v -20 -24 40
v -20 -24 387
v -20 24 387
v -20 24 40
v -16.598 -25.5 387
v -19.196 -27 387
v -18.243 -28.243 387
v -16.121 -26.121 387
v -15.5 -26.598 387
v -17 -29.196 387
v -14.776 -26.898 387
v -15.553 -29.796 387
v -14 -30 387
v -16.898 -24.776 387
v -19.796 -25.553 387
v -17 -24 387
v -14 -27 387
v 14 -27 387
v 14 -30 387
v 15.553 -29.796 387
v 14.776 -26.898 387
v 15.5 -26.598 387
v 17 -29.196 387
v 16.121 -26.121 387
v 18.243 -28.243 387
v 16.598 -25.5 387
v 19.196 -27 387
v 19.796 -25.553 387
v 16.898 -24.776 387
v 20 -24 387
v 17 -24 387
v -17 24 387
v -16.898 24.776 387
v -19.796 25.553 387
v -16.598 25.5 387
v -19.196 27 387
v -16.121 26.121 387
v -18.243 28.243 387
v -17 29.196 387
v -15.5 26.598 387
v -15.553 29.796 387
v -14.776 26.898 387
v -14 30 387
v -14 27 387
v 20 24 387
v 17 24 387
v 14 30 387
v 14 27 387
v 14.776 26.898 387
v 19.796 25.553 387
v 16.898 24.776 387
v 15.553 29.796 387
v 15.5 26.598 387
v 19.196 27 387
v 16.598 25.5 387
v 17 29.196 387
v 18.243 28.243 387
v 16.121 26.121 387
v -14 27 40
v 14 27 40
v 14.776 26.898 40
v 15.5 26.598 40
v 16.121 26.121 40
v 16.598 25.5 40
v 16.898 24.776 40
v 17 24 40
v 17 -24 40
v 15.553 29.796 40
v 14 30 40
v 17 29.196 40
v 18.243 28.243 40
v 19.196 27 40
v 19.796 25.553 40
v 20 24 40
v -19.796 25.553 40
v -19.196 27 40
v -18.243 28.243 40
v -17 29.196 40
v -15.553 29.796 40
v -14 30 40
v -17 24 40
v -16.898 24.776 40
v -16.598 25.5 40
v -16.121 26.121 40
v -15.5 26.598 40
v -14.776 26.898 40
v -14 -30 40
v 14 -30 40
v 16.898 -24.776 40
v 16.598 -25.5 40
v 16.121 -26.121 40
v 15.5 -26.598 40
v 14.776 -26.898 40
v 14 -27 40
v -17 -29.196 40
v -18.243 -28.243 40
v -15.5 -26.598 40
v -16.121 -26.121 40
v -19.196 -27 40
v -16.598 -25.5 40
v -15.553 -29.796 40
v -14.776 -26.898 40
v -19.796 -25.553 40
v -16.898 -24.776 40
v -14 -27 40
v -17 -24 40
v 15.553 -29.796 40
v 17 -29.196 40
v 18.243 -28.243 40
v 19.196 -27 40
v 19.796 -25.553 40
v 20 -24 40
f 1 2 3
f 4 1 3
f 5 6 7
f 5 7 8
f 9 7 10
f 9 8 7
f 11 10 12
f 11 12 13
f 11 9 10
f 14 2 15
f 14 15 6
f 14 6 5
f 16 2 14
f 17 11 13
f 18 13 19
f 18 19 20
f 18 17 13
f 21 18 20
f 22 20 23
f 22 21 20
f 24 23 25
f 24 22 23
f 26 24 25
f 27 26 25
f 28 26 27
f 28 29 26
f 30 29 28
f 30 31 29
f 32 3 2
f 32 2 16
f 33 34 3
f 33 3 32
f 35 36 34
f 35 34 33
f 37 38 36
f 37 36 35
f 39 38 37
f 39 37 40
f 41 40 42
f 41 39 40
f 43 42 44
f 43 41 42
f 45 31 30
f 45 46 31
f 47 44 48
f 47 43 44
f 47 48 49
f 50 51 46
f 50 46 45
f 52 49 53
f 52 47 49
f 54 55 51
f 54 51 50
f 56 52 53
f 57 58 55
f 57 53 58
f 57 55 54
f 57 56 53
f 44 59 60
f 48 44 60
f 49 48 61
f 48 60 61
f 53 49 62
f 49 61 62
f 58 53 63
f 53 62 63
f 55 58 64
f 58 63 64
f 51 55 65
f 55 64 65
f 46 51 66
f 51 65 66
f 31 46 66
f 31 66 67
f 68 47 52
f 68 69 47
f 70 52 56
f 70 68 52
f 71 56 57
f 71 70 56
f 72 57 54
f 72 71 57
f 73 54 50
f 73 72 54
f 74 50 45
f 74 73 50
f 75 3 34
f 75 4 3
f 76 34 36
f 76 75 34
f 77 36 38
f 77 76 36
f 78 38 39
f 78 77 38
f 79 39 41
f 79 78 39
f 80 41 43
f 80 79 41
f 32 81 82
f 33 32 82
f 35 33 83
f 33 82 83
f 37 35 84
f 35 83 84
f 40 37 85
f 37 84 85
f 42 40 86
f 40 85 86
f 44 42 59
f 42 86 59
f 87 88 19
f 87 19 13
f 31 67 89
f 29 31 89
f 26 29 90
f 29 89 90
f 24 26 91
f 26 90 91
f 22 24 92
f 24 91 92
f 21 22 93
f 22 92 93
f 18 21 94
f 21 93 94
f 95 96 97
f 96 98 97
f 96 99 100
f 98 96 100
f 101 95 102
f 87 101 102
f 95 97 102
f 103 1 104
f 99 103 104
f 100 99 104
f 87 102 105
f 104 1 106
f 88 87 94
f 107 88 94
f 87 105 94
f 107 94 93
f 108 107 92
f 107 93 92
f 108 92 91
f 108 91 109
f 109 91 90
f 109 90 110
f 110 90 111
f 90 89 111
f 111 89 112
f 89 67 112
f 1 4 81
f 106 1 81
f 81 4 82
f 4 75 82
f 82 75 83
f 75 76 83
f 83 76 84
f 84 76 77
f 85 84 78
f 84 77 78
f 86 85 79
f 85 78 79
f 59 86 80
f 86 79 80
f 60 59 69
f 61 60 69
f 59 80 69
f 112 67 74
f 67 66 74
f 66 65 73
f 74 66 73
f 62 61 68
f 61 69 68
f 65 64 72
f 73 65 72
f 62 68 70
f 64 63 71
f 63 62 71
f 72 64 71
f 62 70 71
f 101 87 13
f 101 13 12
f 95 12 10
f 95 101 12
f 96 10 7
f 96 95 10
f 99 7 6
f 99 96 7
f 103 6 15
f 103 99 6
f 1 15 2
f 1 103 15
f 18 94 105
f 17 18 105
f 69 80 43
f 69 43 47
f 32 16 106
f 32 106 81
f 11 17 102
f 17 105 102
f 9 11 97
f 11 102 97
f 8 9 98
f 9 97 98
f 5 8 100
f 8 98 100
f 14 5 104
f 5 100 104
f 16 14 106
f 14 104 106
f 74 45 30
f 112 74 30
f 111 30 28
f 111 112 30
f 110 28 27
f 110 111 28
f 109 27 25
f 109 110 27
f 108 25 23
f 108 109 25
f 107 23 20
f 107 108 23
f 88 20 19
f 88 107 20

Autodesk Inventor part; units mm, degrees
ref_plane "YZ Plane" through (0, 0, 0) normal (1, 0, 0) x (0, 1, 0)
ref_plane "Start Plane" through (0, 0, 40) normal (0, 0, 1) x (1, 0, 0)
ref_plane "End Plane" through (0, 0, 387) normal (0, 0, 1) x (1, 0, 0)
sketch "Sketch" plane through (0, 0, 0) normal (0, 0, 1) x (1, 0, 0)
  line L0 (-20, -24) -> (-20, 24)
  line L1 (-14, 30) -> (14, 30)
  line L2 (20, 24) -> (20, -24)
  line L3 (14, -30) -> (-14, -30)
  arc A0 (-20, -24) -> (-14, -30) centre (-14, -24) ccw
  arc A1 (20, 24) -> (14, 30) centre (14, 24) ccw
  arc A2 (-14, 30) -> (-20, 24) centre (-14, 24) ccw
  arc A3 (14, -30) -> (20, -24) centre (14, -24) ccw
  arc A4 (-14, 27) -> (-17, 24) centre (-14, 24) ccw
  line L4 (-14, 27) -> (14, 27)
  arc A5 (17, 24) -> (14, 27) centre (14, 24) ccw
  line L5 (17, 24) -> (17, -24)
  arc A6 (14, -27) -> (17, -24) centre (14, -24) ccw
  line L6 (14, -27) -> (-14, -27)
  arc A7 (-17, -24) -> (-14, -27) centre (-14, -24) ccw
  line L7 (-17, -24) -> (-17, 24)
  line L8 (0, 43.7397) -> (0, -43.7397) construction
  line L9 (-29.7397, 0) -> (29.7397, 0) construction
  dimension "d7" = 6
  dimension "d9" = 40
  dimension "d11" = 60
  dimension "d12" = 3
  dimension "d15" = 20
  dimension "d16" = 30
extrude "Body" add sketch "Sketch" along normal up to surface (347 mm away) from surface at 40
sketch "Sketch3" plane through (0, 0, 0) normal (0, 0, 1) x (1, 0, 0)
  line L0 (0, 0) -> (10, 0)
ref_plane "Work Plane3" through (0, 0, 0) normal (0, -1, 0) x (1, 0, 0)
sketch "Sketch4" plane through (0, 0, 0) normal (0, -1, 0) x (1, 0, 0)
  line L0 (-2, 40) -> (12, 40) projected
  line L1 (-2, 387) -> (12, 387) projected
  dimension "d18" = 347
equation "\"d7\" = G_IR"
equation "\"d9\" = G_W"
equation "\"d11\" = G_H"
equation "\"d12\" = G_T"
equation "\"d15\" = 0.5 * d9"
equation "\"d16\" = 0.5 * d11"
equation "\"d3\" = G_L"
equation "\"G_W\" = 40"
equation "\"G_H\" = 60"
equation "\"G_T\" = 3"
equation "\"G_IR\" = 6"
equation "\"G_L\" = d18"
equation "\"d14\" = G_OFFSET_END + B_L"
equation "\"B_L\" = 407"
equation "\"G_OFFSET_END\" = -20"
properties part number "ISO 4019 - 60x40x3 - 347" material "Steel, Mild"
